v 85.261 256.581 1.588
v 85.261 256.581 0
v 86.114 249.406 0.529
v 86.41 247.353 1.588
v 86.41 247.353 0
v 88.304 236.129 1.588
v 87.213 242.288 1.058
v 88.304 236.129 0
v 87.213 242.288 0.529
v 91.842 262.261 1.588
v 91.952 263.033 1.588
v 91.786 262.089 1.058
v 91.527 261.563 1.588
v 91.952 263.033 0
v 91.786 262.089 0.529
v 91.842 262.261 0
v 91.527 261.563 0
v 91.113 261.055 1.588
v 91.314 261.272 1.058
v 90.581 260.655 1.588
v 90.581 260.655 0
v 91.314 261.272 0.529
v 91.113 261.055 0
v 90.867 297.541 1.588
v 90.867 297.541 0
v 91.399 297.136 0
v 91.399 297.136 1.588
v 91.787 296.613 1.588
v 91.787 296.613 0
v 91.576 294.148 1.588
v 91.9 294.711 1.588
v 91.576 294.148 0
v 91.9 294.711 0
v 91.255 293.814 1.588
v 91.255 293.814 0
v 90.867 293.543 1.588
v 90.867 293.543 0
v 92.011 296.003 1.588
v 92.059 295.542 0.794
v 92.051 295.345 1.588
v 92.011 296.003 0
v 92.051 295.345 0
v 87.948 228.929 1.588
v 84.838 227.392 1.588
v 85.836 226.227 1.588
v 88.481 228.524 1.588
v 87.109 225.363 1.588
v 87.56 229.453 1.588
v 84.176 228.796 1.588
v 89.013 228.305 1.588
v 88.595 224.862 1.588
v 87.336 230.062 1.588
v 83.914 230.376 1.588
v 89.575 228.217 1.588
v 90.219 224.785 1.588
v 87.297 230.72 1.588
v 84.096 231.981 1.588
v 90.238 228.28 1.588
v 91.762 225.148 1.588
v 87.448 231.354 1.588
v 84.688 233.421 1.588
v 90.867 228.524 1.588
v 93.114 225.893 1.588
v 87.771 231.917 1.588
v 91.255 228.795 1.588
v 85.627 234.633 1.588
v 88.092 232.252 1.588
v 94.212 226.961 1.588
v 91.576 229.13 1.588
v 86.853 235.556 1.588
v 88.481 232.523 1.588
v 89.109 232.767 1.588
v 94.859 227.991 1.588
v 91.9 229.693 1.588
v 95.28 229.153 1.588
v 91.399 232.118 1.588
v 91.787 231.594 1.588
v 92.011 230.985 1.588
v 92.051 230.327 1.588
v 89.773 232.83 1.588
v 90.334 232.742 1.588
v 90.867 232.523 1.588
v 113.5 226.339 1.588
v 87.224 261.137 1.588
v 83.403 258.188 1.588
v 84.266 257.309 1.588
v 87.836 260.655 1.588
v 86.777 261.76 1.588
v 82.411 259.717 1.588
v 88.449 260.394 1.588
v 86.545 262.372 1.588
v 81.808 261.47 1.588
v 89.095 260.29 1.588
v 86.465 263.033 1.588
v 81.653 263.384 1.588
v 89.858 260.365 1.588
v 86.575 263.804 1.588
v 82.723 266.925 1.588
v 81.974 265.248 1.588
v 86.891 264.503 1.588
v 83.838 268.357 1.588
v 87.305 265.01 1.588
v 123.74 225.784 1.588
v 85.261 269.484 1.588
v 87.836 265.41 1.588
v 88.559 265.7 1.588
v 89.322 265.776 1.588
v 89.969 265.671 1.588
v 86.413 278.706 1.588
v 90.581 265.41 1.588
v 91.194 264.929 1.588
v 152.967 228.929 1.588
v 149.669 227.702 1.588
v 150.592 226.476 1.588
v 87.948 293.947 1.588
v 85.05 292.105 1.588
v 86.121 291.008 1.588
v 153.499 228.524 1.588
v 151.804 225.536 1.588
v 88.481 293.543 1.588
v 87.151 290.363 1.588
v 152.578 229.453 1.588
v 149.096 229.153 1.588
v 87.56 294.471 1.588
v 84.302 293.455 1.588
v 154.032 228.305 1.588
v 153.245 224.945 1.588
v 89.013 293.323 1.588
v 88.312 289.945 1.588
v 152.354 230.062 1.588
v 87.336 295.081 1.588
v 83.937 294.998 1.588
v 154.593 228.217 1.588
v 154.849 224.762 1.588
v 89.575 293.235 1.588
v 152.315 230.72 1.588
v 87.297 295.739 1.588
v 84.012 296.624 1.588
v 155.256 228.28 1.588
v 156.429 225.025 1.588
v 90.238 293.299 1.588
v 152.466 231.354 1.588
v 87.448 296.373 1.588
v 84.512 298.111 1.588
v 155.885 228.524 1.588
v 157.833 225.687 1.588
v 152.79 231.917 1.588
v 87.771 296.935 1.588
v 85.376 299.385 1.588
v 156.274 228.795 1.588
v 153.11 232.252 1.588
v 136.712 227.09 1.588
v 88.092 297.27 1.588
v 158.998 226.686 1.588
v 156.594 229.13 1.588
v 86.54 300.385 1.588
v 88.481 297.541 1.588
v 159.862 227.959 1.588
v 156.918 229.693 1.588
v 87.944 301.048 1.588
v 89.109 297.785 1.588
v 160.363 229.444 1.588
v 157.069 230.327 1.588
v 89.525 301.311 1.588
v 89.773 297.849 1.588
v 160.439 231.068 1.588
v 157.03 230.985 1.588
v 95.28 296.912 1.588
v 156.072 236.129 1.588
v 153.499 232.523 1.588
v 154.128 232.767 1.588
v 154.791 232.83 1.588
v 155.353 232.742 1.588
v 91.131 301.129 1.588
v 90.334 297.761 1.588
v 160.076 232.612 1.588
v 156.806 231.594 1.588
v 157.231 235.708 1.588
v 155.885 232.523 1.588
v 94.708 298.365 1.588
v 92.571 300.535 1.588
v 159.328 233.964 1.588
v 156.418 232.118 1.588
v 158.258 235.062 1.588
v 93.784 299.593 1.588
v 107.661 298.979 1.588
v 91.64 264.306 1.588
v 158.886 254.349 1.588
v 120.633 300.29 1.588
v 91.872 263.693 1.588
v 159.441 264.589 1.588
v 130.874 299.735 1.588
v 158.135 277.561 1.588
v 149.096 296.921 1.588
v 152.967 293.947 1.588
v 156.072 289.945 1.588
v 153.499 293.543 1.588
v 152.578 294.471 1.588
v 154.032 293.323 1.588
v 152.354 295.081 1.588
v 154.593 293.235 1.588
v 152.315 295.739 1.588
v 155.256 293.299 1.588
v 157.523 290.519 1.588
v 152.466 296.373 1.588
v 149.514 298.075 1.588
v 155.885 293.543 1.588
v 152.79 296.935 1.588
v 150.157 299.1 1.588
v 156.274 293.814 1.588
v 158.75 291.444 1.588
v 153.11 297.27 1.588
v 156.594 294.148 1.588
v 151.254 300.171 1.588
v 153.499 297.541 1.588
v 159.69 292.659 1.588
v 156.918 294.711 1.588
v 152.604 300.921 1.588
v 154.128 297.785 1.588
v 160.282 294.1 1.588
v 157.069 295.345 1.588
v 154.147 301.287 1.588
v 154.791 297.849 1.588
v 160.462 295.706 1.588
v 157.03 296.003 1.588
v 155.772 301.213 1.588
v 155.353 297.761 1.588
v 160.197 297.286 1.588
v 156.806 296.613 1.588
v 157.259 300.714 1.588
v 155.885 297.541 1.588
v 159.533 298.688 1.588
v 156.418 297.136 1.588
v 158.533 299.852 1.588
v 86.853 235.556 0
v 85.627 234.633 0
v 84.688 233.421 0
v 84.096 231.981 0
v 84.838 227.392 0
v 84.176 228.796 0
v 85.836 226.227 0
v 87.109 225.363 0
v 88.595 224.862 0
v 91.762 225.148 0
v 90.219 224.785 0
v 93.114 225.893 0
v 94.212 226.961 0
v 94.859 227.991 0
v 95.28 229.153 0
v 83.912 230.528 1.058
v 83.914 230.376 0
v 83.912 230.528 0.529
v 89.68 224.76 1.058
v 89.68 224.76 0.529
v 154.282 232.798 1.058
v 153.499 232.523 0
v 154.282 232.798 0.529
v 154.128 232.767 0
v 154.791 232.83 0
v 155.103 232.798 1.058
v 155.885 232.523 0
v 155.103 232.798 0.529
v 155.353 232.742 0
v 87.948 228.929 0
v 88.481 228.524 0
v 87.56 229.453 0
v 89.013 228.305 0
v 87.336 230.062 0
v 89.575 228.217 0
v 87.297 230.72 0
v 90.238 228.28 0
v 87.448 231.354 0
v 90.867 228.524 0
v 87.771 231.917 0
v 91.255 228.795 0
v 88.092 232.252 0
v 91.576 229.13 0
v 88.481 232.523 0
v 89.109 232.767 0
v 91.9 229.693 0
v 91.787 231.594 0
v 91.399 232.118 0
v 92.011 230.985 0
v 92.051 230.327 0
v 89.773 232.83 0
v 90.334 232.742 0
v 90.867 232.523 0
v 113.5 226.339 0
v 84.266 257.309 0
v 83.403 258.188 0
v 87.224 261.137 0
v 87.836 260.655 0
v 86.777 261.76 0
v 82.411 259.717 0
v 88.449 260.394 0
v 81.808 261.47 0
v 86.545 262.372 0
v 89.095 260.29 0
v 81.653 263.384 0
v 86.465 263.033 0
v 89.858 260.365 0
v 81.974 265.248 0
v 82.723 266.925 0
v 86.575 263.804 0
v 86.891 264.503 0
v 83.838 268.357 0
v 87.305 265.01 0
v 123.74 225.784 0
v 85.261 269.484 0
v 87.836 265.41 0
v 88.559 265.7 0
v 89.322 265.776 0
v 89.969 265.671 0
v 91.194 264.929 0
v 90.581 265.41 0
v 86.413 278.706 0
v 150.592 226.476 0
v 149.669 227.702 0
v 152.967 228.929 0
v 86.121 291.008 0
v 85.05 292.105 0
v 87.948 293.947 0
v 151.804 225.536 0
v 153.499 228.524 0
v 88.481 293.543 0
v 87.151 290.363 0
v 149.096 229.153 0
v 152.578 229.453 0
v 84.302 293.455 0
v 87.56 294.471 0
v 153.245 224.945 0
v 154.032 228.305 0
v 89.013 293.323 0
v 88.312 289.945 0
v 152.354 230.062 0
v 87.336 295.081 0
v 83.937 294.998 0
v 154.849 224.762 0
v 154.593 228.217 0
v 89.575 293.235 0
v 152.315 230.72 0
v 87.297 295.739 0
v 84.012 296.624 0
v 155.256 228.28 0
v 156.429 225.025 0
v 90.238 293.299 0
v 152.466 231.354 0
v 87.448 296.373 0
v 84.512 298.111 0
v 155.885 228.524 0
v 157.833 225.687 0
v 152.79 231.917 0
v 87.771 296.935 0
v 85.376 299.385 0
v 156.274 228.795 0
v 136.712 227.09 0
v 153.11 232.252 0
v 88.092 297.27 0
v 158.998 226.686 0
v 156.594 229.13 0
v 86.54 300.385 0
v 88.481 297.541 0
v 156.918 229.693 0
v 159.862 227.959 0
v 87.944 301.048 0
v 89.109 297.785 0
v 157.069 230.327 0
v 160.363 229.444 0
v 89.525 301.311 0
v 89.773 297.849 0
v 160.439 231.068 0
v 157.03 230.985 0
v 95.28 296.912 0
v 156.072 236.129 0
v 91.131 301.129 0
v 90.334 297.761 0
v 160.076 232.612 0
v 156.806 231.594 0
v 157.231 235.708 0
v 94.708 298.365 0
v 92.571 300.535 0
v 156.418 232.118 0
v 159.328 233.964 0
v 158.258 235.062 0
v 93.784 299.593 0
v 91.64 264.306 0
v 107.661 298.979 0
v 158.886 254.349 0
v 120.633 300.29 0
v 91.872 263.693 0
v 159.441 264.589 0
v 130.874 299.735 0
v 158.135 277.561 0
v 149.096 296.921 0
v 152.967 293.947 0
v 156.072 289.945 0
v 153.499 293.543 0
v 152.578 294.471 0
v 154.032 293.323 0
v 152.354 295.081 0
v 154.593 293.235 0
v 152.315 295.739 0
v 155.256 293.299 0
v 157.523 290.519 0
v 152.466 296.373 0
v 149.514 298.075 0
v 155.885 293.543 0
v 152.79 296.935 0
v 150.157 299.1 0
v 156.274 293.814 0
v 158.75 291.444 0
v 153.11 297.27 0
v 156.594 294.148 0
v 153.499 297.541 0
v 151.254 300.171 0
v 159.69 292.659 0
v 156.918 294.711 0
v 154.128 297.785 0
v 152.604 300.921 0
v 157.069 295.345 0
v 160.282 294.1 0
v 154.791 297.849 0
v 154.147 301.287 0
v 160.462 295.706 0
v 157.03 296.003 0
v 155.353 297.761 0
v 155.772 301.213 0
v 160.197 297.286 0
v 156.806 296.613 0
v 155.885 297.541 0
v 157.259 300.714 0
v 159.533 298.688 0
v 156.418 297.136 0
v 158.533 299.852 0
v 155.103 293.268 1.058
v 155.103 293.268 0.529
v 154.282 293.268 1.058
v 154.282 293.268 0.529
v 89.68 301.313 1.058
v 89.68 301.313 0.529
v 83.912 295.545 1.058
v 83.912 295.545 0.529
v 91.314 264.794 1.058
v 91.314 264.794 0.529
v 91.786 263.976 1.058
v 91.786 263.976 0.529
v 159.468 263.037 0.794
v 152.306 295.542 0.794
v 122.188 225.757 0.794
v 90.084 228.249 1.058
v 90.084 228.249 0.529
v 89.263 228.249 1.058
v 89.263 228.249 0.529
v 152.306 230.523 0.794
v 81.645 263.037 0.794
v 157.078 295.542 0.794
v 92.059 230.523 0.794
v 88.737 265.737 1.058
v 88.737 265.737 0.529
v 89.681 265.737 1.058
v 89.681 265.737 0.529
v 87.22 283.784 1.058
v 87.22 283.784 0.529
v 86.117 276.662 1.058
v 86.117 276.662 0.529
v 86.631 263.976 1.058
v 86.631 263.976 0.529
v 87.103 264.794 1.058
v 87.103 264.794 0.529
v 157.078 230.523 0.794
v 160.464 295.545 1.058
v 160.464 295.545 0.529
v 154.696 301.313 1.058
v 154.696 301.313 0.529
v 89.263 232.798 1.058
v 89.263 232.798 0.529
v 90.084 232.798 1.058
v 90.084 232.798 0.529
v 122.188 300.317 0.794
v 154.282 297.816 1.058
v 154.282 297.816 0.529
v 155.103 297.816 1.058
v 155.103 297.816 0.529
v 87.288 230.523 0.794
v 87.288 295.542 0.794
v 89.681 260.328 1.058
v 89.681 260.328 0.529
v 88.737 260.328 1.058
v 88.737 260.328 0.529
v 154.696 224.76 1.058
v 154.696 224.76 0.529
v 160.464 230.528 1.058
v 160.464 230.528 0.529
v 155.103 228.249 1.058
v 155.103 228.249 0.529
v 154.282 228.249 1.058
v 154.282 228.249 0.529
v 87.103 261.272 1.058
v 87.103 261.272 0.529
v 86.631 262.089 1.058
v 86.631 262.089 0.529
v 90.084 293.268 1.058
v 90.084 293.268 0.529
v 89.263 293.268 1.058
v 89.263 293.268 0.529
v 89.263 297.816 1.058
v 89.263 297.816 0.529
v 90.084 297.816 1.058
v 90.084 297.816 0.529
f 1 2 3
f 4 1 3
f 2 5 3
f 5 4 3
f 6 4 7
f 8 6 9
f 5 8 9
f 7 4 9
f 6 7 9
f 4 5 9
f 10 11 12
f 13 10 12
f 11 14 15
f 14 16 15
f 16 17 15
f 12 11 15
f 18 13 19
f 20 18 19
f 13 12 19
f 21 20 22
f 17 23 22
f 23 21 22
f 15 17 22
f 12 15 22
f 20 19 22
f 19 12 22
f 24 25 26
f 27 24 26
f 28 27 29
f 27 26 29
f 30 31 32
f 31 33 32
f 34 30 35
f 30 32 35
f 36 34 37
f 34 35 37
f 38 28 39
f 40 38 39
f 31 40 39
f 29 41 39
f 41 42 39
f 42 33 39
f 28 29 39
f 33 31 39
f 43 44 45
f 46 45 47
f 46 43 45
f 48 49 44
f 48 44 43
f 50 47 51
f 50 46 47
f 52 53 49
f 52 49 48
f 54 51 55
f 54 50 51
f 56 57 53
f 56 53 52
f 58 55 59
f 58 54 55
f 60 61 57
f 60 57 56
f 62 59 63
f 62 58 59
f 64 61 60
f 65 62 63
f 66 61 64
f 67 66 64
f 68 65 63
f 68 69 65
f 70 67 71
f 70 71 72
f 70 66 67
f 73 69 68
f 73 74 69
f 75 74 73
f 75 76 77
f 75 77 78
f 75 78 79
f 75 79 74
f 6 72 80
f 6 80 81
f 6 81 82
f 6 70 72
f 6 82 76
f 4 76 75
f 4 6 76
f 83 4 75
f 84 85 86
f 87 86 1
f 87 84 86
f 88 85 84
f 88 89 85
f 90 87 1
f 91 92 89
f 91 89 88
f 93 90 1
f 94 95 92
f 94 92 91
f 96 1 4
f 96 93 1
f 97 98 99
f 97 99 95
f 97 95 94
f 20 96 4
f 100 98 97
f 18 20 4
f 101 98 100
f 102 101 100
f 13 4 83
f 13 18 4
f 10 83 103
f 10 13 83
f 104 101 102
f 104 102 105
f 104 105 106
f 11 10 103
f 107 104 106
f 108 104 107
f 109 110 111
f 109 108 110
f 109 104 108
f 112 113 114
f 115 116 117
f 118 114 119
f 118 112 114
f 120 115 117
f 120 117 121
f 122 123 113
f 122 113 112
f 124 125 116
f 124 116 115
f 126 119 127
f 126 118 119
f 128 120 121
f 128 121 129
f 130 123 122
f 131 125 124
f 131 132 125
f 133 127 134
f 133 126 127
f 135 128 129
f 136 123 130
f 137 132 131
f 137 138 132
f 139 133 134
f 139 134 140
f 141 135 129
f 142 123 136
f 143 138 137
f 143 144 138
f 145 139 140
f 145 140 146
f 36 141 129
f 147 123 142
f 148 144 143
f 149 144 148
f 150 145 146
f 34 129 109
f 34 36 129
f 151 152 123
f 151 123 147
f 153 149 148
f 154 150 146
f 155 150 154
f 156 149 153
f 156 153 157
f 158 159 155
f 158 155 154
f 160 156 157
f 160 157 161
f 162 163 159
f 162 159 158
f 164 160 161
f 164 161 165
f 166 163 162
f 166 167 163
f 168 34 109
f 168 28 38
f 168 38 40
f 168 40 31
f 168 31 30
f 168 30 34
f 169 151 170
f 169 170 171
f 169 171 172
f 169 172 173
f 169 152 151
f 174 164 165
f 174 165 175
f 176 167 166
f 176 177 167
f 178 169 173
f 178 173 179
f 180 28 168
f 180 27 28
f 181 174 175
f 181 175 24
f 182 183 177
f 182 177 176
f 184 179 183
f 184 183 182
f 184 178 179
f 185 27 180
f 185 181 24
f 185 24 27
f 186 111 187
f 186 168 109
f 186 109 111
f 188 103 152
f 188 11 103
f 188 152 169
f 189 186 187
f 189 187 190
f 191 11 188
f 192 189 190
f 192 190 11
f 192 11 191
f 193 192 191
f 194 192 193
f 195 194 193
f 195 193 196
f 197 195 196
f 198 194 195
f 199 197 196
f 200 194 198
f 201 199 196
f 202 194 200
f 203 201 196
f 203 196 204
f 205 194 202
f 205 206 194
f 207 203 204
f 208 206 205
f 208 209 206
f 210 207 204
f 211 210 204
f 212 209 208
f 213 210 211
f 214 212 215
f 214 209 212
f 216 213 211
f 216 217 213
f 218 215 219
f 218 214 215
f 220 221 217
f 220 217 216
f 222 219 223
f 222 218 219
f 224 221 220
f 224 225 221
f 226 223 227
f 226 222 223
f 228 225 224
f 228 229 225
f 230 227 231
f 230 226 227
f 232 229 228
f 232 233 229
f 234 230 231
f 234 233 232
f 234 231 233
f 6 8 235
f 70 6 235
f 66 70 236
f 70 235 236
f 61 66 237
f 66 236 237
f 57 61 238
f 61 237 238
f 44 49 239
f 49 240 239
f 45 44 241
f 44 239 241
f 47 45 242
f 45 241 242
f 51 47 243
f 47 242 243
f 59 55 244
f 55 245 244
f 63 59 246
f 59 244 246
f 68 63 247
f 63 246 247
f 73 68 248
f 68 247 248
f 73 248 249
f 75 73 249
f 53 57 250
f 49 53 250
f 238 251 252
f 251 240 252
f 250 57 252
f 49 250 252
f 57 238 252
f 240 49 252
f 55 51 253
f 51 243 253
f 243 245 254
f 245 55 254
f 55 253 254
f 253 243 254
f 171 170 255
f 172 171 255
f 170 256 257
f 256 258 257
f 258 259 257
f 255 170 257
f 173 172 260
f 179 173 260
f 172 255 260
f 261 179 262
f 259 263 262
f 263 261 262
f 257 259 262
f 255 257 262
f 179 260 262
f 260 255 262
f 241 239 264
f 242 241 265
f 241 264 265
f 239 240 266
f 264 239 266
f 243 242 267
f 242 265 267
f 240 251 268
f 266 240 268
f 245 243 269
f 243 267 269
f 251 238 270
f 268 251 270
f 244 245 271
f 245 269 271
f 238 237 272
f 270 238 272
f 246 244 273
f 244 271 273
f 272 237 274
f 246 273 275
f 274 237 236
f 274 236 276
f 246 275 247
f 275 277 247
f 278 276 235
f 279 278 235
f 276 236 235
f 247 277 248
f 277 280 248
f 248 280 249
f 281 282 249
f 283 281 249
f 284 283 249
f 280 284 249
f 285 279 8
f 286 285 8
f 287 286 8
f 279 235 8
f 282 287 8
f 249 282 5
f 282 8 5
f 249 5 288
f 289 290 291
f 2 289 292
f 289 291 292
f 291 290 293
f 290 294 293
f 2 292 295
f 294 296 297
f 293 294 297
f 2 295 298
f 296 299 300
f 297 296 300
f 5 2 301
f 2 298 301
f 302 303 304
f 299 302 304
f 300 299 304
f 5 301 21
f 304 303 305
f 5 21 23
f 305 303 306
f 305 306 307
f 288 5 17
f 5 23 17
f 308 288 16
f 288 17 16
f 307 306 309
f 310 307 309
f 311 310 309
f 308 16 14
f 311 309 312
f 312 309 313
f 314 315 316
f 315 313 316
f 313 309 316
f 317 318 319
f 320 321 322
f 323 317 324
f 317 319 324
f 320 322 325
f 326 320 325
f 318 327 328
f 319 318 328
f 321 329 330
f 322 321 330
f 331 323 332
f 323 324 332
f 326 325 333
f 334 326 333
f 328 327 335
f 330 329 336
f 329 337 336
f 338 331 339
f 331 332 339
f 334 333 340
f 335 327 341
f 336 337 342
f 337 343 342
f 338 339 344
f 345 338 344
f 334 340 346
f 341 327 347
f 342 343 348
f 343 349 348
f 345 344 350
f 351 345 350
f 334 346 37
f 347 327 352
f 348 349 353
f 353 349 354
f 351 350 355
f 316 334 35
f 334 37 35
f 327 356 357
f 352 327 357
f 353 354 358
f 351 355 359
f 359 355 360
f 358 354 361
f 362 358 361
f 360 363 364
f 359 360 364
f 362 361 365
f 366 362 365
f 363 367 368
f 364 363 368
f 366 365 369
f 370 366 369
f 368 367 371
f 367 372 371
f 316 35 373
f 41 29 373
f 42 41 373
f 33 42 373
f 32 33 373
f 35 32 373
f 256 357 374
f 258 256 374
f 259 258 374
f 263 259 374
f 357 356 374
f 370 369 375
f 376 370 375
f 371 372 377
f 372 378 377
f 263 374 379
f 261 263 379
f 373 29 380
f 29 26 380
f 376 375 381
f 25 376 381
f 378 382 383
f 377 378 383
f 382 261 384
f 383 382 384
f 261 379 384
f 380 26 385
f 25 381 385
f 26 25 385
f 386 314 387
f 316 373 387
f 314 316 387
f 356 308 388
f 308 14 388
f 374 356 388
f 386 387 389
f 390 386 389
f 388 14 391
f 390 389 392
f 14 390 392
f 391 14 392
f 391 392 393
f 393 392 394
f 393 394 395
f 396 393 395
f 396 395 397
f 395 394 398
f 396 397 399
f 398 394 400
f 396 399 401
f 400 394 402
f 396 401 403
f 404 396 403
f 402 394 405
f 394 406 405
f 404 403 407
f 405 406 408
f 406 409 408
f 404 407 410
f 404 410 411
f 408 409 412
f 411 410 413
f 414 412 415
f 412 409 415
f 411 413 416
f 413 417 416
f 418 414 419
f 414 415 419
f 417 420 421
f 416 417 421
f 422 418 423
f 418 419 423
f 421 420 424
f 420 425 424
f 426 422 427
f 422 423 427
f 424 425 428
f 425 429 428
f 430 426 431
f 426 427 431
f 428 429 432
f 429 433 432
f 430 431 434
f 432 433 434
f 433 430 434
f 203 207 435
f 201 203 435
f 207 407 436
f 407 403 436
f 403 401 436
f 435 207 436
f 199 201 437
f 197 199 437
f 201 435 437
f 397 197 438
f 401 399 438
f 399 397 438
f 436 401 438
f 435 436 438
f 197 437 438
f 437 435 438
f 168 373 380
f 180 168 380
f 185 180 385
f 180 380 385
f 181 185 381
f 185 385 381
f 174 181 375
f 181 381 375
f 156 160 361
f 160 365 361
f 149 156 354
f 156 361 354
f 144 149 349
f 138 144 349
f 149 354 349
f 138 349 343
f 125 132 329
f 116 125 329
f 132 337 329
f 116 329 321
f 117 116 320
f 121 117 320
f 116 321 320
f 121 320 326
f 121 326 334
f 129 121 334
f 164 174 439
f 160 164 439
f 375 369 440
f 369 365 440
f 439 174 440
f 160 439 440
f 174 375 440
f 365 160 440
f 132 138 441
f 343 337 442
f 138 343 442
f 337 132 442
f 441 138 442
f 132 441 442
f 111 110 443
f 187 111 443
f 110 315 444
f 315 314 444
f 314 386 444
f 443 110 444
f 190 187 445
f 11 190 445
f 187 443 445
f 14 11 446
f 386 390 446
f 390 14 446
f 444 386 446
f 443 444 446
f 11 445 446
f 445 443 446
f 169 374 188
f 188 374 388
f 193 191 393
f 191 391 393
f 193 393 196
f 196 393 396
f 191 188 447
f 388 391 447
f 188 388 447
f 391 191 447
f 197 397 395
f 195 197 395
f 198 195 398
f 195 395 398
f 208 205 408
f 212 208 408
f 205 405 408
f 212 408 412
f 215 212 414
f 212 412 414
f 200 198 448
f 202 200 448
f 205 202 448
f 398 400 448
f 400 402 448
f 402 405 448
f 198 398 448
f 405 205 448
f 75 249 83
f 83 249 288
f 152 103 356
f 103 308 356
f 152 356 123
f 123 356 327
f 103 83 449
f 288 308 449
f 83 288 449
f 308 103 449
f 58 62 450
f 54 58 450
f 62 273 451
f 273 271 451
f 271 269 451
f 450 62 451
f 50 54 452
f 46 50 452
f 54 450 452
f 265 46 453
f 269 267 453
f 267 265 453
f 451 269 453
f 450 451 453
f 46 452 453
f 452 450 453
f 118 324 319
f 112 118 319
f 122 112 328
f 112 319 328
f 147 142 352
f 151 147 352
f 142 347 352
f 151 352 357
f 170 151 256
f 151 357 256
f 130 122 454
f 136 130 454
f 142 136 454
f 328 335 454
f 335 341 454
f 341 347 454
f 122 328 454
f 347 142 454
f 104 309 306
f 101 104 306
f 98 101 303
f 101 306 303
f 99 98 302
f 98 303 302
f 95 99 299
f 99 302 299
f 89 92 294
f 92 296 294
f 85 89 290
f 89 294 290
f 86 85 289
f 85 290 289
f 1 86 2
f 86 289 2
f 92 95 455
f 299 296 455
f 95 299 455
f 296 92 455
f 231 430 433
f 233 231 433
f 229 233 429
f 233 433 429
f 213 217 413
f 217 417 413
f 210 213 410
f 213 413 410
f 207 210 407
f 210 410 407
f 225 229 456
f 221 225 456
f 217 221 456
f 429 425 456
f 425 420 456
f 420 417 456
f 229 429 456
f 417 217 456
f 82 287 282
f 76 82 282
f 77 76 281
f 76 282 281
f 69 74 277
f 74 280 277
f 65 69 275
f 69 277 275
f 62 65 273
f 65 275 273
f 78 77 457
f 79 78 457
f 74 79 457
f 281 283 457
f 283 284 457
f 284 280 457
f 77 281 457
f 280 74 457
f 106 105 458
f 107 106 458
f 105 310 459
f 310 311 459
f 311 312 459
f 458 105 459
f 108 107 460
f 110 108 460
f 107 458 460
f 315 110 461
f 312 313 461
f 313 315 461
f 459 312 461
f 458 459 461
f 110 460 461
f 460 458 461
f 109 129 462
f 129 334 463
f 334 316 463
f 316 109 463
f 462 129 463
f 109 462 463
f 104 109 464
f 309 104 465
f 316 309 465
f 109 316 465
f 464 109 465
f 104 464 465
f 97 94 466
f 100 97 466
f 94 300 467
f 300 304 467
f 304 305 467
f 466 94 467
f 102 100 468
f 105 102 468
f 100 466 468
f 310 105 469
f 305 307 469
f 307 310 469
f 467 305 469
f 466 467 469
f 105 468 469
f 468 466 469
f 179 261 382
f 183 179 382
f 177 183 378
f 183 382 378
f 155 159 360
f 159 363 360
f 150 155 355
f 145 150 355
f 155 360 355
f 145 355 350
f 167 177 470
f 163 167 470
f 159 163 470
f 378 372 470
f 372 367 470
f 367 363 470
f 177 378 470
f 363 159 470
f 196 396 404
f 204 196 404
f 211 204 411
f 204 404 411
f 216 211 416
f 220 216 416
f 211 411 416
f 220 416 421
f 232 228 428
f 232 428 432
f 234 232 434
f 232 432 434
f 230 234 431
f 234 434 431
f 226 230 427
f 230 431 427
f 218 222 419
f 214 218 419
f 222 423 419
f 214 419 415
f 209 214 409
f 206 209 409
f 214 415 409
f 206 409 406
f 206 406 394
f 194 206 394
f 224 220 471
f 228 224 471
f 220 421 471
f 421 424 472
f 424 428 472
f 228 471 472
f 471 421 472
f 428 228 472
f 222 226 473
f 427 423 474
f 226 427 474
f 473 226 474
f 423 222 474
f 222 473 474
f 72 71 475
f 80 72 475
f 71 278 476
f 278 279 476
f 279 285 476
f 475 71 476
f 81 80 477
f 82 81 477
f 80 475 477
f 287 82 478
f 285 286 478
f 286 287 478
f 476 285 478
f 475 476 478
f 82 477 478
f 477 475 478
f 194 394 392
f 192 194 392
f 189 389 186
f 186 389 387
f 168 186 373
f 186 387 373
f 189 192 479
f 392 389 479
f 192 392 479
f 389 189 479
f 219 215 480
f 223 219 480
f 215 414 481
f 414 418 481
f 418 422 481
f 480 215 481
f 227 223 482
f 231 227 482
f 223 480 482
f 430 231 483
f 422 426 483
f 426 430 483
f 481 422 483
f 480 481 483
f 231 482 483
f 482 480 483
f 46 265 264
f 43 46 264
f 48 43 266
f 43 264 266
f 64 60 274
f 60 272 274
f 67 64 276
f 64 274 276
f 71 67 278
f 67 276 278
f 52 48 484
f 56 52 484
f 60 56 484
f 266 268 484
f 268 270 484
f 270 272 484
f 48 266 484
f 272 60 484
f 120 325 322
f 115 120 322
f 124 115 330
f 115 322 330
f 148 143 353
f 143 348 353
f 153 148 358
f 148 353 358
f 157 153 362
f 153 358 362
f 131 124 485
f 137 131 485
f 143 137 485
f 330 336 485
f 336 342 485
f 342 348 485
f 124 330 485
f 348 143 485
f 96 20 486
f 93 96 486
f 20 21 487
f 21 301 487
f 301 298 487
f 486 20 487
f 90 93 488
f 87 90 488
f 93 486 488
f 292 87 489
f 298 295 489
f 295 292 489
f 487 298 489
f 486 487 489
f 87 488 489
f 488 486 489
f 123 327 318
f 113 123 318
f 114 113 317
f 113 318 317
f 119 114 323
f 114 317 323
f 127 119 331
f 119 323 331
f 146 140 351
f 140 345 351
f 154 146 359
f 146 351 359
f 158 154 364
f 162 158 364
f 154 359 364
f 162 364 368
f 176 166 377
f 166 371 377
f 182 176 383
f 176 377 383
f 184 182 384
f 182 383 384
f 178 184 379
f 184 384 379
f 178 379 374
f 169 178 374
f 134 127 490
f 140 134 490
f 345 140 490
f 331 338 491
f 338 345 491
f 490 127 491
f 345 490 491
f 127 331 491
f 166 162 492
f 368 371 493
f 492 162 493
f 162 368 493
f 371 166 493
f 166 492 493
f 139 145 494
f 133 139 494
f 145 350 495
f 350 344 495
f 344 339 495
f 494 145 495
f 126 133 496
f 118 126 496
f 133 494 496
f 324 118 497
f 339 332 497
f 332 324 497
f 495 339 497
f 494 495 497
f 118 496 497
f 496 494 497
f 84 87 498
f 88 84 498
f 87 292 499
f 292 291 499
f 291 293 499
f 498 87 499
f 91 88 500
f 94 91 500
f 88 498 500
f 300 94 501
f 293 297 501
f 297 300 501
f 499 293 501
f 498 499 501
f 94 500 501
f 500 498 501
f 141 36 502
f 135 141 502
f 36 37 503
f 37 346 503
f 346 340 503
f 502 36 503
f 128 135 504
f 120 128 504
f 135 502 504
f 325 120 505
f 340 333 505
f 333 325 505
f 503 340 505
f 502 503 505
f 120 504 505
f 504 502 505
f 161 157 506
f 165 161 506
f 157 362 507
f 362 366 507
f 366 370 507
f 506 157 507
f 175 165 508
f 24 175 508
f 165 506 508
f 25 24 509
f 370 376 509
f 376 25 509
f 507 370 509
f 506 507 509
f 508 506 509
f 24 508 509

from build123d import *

# Parameters (mm, degrees)
BOSS_EXTRUDE1_DEPTH = 1.5875


with BuildPart() as part:
    # Model → Boss-Extrude1 (new body)
    with BuildSketch(Plane.XY):
        with BuildLine():
            add(Edge.make_bspline(
                [(89.679503, 301.313208), (86.494276, 301.313208), (83.911587, 298.730519), (83.911587, 295.545291)],
                knots=[0, 0, 0, 0, 1, 1, 1, 1], degree=3))
            add(Edge.make_bspline(
                [(83.911587, 295.545291), (83.911587, 292.829941), (85.785539, 290.557671), (88.31249, 289.944944)],
                knots=[0, 0, 0, 0, 1, 1, 1, 1], degree=3))
            add(Edge.make_bspline(
                [(88.31249, 289.944944), (87.310513, 284.565975), (85.908351, 276.388431), (85.260962, 269.483833)],
                knots=[0, 0, 0, 0, 1, 1, 1, 1], degree=3))
            add(Edge.make_bspline(
                [(85.260962, 269.483833), (83.093371, 268.154414), (81.64499, 265.765961), (81.64499, 263.036819)],
                knots=[0, 0, 0, 0, 1, 1, 1, 1], degree=3))
            add(Edge.make_bspline(
                [(81.64499, 263.036819), (81.64499, 260.307676), (83.093371, 257.910405), (85.260962, 256.580986)],
                knots=[0, 0, 0, 0, 1, 1, 1, 1], degree=3))
            add(Edge.make_bspline(
                [(85.260962, 256.580986), (85.906026, 249.677664), (87.302312, 241.509238), (88.30367, 236.128694)],
                knots=[0, 0, 0, 0, 1, 1, 1, 1], degree=3))
            add(Edge.make_bspline(
                [(88.30367, 236.128694), (85.780618, 235.513204), (83.911587, 233.240931), (83.911587, 230.528347)],
                knots=[0, 0, 0, 0, 1, 1, 1, 1], degree=3))
            add(Edge.make_bspline(
                [(83.911587, 230.528347), (83.911587, 227.343119), (86.494276, 224.76043), (89.679503, 224.76043)],
                knots=[0, 0, 0, 0, 1, 1, 1, 1], degree=3))
            add(Edge.make_bspline(
                [(89.679503, 224.76043), (92.392088, 224.76043), (94.664361, 226.629461), (95.279851, 229.152513)],
                knots=[0, 0, 0, 0, 1, 1, 1, 1], degree=3))
            add(Edge.make_bspline(
                [(95.279851, 229.152513), (102.491944, 227.810293), (114.729782, 225.757027), (122.187976, 225.757027)],
                knots=[0, 0, 0, 0, 1, 1, 1, 1], degree=3))
            add(Edge.make_bspline(
                [(122.187976, 225.757027), (129.646172, 225.757027), (141.884008, 227.810293), (149.096101, 229.152513)],
                knots=[0, 0, 0, 0, 1, 1, 1, 1], degree=3))
            add(Edge.make_bspline(
                [(149.096101, 229.152513), (149.711751, 226.629689), (151.984027, 224.76043), (154.696448, 224.76043)],
                knots=[0, 0, 0, 0, 1, 1, 1, 1], degree=3))
            add(Edge.make_bspline(
                [(154.696448, 224.76043), (157.881676, 224.76043), (160.464365, 227.343119), (160.464365, 230.528347)],
                knots=[0, 0, 0, 0, 1, 1, 1, 1], degree=3))
            add(Edge.make_bspline(
                [(160.464365, 230.528347), (160.464365, 233.238648), (158.592116, 235.510935), (156.072281, 236.128694)],
                knots=[0, 0, 0, 0, 1, 1, 1, 1], degree=3))
            add(Edge.make_bspline(
                [(156.072281, 236.128694), (157.414502, 243.340787), (159.467767, 255.578623), (159.467767, 263.036819)],
                knots=[0, 0, 0, 0, 1, 1, 1, 1], degree=3))
            add(Edge.make_bspline(
                [(159.467767, 263.036819), (159.467767, 270.495015), (157.414502, 282.732851), (156.072281, 289.944944)],
                knots=[0, 0, 0, 0, 1, 1, 1, 1], degree=3))
            add(Edge.make_bspline(
                [(156.072281, 289.944944), (158.591922, 290.562841), (160.464365, 292.835128), (160.464365, 295.545291)],
                knots=[0, 0, 0, 0, 1, 1, 1, 1], degree=3))
            add(Edge.make_bspline(
                [(160.464365, 295.545291), (160.464365, 298.730519), (157.881676, 301.313208), (154.696448, 301.313208)],
                knots=[0, 0, 0, 0, 1, 1, 1, 1], degree=3))
            add(Edge.make_bspline(
                [(154.696448, 301.313208), (151.986285, 301.313208), (149.713998, 299.440765), (149.096101, 296.921125)],
                knots=[0, 0, 0, 0, 1, 1, 1, 1], degree=3))
            add(Edge.make_bspline(
                [(149.096101, 296.921125), (141.884008, 298.263345), (129.646172, 300.316611), (122.187976, 300.316611)],
                knots=[0, 0, 0, 0, 1, 1, 1, 1], degree=3))
            add(Edge.make_bspline(
                [(122.187976, 300.316611), (114.728292, 300.316611), (102.490648, 298.255381), (95.279851, 296.912305)],
                knots=[0, 0, 0, 0, 1, 1, 1, 1], degree=3))
            add(Edge.make_bspline(
                [(95.279851, 296.912305), (94.665134, 299.436447), (92.392861, 301.313208), (89.679503, 301.313208)],
                knots=[0, 0, 0, 0, 1, 1, 1, 1], degree=3))
        make_face()
        with BuildLine():
            add(Edge.make_bspline(
                [(92.059468, 295.541961), (92.059468, 294.717126), (91.604739, 293.954948), (90.866572, 293.54253)],
                knots=[0, 0, 0, 0, 1, 1, 1, 1], degree=3))
            add(Edge.make_bspline(
                [(90.866572, 293.54253), (90.128406, 293.130113), (89.218948, 293.130113), (88.480782, 293.54253)],
                knots=[0, 0, 0, 0, 1, 1, 1, 1], degree=3))
            add(Edge.make_bspline(
                [(88.480782, 293.54253), (87.742615, 293.954948), (87.287886, 294.717126), (87.287886, 295.541961)],
                knots=[0, 0, 0, 0, 1, 1, 1, 1], degree=3))
            add(Edge.make_bspline(
                [(87.287886, 295.541961), (87.287886, 296.366796), (87.742615, 297.128975), (88.480782, 297.541392)],
                knots=[0, 0, 0, 0, 1, 1, 1, 1], degree=3))
            add(Edge.make_bspline(
                [(88.480782, 297.541392), (89.218948, 297.95381), (90.128406, 297.95381), (90.866572, 297.541392)],
                knots=[0, 0, 0, 0, 1, 1, 1, 1], degree=3))
            add(Edge.make_bspline(
                [(90.866572, 297.541392), (91.604739, 297.128975), (92.059468, 296.366796), (92.059468, 295.541961)],
                knots=[0, 0, 0, 0, 1, 1, 1, 1], degree=3))
        make_face(mode=Mode.SUBTRACT)
        with BuildLine():
            add(Edge.make_bspline(
                [(157.077982, 230.523445), (157.077982, 229.69861), (156.623252, 228.936431), (155.885086, 228.524014)],
                knots=[0, 0, 0, 0, 1, 1, 1, 1], degree=3))
            add(Edge.make_bspline(
                [(155.885086, 228.524014), (155.14692, 228.111596), (154.237461, 228.111596), (153.499295, 228.524014)],
                knots=[0, 0, 0, 0, 1, 1, 1, 1], degree=3))
            add(Edge.make_bspline(
                [(153.499295, 228.524014), (152.761129, 228.936431), (152.3064, 229.69861), (152.3064, 230.523445)],
                knots=[0, 0, 0, 0, 1, 1, 1, 1], degree=3))
            add(Edge.make_bspline(
                [(152.3064, 230.523445), (152.3064, 231.34828), (152.761129, 232.110458), (153.499295, 232.522876)],
                knots=[0, 0, 0, 0, 1, 1, 1, 1], degree=3))
            add(Edge.make_bspline(
                [(153.499295, 232.522876), (154.237461, 232.935293), (155.14692, 232.935293), (155.885086, 232.522876)],
                knots=[0, 0, 0, 0, 1, 1, 1, 1], degree=3))
            add(Edge.make_bspline(
                [(155.885086, 232.522876), (156.623252, 232.110458), (157.077982, 231.34828), (157.077982, 230.523445)],
                knots=[0, 0, 0, 0, 1, 1, 1, 1], degree=3))
        make_face(mode=Mode.SUBTRACT)
        with BuildLine():
            add(Edge.make_bspline(
                [(92.059468, 230.523445), (92.059468, 229.69861), (91.604739, 228.936431), (90.866572, 228.524014)],
                knots=[0, 0, 0, 0, 1, 1, 1, 1], degree=3))
            add(Edge.make_bspline(
                [(90.866572, 228.524014), (90.128406, 228.111596), (89.218948, 228.111596), (88.480782, 228.524014)],
                knots=[0, 0, 0, 0, 1, 1, 1, 1], degree=3))
            add(Edge.make_bspline(
                [(88.480782, 228.524014), (87.742615, 228.936431), (87.287886, 229.69861), (87.287886, 230.523445)],
                knots=[0, 0, 0, 0, 1, 1, 1, 1], degree=3))
            add(Edge.make_bspline(
                [(87.287886, 230.523445), (87.287886, 231.34828), (87.742615, 232.110458), (88.480782, 232.522876)],
                knots=[0, 0, 0, 0, 1, 1, 1, 1], degree=3))
            add(Edge.make_bspline(
                [(88.480782, 232.522876), (89.218948, 232.935293), (90.128406, 232.935293), (90.866572, 232.522876)],
                knots=[0, 0, 0, 0, 1, 1, 1, 1], degree=3))
            add(Edge.make_bspline(
                [(90.866572, 232.522876), (91.604739, 232.110458), (92.059468, 231.34828), (92.059468, 230.523445)],
                knots=[0, 0, 0, 0, 1, 1, 1, 1], degree=3))
        make_face(mode=Mode.SUBTRACT)
        with BuildLine():
            add(Edge.make_bspline(
                [(157.077982, 295.541958), (157.077982, 294.717124), (156.623252, 293.954945), (155.885086, 293.542527)],
                knots=[0, 0, 0, 0, 1, 1, 1, 1], degree=3))
            add(Edge.make_bspline(
                [(155.885086, 293.542527), (155.14692, 293.13011), (154.237461, 293.13011), (153.499295, 293.542527)],
                knots=[0, 0, 0, 0, 1, 1, 1, 1], degree=3))
            add(Edge.make_bspline(
                [(153.499295, 293.542527), (152.761129, 293.954945), (152.3064, 294.717124), (152.3064, 295.541958)],
                knots=[0, 0, 0, 0, 1, 1, 1, 1], degree=3))
            add(Edge.make_bspline(
                [(152.3064, 295.541958), (152.3064, 296.366793), (152.761129, 297.128972), (153.499295, 297.54139)],
                knots=[0, 0, 0, 0, 1, 1, 1, 1], degree=3))
            add(Edge.make_bspline(
                [(153.499295, 297.54139), (154.237461, 297.953807), (155.14692, 297.953807), (155.885086, 297.54139)],
                knots=[0, 0, 0, 0, 1, 1, 1, 1], degree=3))
            add(Edge.make_bspline(
                [(155.885086, 297.54139), (156.623252, 297.128972), (157.077982, 296.366793), (157.077982, 295.541958)],
                knots=[0, 0, 0, 0, 1, 1, 1, 1], degree=3))
        make_face(mode=Mode.SUBTRACT)
        with BuildLine():
            add(Edge.make_bspline(
                [(91.952335, 263.032707), (91.952995, 262.052038), (91.430193, 261.14558), (90.581018, 260.655055)],
                knots=[0, 0, 0, 0, 1, 1, 1, 1], degree=3))
            add(Edge.make_bspline(
                [(90.581018, 260.655055), (89.731844, 260.16453), (88.685427, 260.16453), (87.836253, 260.655055)],
                knots=[0, 0, 0, 0, 1, 1, 1, 1], degree=3))
            add(Edge.make_bspline(
                [(87.836253, 260.655055), (86.987078, 261.14558), (86.464276, 262.052038), (86.464936, 263.032707)],
                knots=[0, 0, 0, 0, 1, 1, 1, 1], degree=3))
            add(Edge.make_bspline(
                [(86.464936, 263.032707), (86.464276, 264.013376), (86.987078, 264.919834), (87.836253, 265.410359)],
                knots=[0, 0, 0, 0, 1, 1, 1, 1], degree=3))
            add(Edge.make_bspline(
                [(87.836253, 265.410359), (88.685427, 265.900884), (89.731844, 265.900884), (90.581018, 265.410359)],
                knots=[0, 0, 0, 0, 1, 1, 1, 1], degree=3))
            add(Edge.make_bspline(
                [(90.581018, 265.410359), (91.430193, 264.919834), (91.952995, 264.013376), (91.952335, 263.032707)],
                knots=[0, 0, 0, 0, 1, 1, 1, 1], degree=3))
        make_face(mode=Mode.SUBTRACT)
    extrude(amount=BOSS_EXTRUDE1_DEPTH)


solid = part.part
